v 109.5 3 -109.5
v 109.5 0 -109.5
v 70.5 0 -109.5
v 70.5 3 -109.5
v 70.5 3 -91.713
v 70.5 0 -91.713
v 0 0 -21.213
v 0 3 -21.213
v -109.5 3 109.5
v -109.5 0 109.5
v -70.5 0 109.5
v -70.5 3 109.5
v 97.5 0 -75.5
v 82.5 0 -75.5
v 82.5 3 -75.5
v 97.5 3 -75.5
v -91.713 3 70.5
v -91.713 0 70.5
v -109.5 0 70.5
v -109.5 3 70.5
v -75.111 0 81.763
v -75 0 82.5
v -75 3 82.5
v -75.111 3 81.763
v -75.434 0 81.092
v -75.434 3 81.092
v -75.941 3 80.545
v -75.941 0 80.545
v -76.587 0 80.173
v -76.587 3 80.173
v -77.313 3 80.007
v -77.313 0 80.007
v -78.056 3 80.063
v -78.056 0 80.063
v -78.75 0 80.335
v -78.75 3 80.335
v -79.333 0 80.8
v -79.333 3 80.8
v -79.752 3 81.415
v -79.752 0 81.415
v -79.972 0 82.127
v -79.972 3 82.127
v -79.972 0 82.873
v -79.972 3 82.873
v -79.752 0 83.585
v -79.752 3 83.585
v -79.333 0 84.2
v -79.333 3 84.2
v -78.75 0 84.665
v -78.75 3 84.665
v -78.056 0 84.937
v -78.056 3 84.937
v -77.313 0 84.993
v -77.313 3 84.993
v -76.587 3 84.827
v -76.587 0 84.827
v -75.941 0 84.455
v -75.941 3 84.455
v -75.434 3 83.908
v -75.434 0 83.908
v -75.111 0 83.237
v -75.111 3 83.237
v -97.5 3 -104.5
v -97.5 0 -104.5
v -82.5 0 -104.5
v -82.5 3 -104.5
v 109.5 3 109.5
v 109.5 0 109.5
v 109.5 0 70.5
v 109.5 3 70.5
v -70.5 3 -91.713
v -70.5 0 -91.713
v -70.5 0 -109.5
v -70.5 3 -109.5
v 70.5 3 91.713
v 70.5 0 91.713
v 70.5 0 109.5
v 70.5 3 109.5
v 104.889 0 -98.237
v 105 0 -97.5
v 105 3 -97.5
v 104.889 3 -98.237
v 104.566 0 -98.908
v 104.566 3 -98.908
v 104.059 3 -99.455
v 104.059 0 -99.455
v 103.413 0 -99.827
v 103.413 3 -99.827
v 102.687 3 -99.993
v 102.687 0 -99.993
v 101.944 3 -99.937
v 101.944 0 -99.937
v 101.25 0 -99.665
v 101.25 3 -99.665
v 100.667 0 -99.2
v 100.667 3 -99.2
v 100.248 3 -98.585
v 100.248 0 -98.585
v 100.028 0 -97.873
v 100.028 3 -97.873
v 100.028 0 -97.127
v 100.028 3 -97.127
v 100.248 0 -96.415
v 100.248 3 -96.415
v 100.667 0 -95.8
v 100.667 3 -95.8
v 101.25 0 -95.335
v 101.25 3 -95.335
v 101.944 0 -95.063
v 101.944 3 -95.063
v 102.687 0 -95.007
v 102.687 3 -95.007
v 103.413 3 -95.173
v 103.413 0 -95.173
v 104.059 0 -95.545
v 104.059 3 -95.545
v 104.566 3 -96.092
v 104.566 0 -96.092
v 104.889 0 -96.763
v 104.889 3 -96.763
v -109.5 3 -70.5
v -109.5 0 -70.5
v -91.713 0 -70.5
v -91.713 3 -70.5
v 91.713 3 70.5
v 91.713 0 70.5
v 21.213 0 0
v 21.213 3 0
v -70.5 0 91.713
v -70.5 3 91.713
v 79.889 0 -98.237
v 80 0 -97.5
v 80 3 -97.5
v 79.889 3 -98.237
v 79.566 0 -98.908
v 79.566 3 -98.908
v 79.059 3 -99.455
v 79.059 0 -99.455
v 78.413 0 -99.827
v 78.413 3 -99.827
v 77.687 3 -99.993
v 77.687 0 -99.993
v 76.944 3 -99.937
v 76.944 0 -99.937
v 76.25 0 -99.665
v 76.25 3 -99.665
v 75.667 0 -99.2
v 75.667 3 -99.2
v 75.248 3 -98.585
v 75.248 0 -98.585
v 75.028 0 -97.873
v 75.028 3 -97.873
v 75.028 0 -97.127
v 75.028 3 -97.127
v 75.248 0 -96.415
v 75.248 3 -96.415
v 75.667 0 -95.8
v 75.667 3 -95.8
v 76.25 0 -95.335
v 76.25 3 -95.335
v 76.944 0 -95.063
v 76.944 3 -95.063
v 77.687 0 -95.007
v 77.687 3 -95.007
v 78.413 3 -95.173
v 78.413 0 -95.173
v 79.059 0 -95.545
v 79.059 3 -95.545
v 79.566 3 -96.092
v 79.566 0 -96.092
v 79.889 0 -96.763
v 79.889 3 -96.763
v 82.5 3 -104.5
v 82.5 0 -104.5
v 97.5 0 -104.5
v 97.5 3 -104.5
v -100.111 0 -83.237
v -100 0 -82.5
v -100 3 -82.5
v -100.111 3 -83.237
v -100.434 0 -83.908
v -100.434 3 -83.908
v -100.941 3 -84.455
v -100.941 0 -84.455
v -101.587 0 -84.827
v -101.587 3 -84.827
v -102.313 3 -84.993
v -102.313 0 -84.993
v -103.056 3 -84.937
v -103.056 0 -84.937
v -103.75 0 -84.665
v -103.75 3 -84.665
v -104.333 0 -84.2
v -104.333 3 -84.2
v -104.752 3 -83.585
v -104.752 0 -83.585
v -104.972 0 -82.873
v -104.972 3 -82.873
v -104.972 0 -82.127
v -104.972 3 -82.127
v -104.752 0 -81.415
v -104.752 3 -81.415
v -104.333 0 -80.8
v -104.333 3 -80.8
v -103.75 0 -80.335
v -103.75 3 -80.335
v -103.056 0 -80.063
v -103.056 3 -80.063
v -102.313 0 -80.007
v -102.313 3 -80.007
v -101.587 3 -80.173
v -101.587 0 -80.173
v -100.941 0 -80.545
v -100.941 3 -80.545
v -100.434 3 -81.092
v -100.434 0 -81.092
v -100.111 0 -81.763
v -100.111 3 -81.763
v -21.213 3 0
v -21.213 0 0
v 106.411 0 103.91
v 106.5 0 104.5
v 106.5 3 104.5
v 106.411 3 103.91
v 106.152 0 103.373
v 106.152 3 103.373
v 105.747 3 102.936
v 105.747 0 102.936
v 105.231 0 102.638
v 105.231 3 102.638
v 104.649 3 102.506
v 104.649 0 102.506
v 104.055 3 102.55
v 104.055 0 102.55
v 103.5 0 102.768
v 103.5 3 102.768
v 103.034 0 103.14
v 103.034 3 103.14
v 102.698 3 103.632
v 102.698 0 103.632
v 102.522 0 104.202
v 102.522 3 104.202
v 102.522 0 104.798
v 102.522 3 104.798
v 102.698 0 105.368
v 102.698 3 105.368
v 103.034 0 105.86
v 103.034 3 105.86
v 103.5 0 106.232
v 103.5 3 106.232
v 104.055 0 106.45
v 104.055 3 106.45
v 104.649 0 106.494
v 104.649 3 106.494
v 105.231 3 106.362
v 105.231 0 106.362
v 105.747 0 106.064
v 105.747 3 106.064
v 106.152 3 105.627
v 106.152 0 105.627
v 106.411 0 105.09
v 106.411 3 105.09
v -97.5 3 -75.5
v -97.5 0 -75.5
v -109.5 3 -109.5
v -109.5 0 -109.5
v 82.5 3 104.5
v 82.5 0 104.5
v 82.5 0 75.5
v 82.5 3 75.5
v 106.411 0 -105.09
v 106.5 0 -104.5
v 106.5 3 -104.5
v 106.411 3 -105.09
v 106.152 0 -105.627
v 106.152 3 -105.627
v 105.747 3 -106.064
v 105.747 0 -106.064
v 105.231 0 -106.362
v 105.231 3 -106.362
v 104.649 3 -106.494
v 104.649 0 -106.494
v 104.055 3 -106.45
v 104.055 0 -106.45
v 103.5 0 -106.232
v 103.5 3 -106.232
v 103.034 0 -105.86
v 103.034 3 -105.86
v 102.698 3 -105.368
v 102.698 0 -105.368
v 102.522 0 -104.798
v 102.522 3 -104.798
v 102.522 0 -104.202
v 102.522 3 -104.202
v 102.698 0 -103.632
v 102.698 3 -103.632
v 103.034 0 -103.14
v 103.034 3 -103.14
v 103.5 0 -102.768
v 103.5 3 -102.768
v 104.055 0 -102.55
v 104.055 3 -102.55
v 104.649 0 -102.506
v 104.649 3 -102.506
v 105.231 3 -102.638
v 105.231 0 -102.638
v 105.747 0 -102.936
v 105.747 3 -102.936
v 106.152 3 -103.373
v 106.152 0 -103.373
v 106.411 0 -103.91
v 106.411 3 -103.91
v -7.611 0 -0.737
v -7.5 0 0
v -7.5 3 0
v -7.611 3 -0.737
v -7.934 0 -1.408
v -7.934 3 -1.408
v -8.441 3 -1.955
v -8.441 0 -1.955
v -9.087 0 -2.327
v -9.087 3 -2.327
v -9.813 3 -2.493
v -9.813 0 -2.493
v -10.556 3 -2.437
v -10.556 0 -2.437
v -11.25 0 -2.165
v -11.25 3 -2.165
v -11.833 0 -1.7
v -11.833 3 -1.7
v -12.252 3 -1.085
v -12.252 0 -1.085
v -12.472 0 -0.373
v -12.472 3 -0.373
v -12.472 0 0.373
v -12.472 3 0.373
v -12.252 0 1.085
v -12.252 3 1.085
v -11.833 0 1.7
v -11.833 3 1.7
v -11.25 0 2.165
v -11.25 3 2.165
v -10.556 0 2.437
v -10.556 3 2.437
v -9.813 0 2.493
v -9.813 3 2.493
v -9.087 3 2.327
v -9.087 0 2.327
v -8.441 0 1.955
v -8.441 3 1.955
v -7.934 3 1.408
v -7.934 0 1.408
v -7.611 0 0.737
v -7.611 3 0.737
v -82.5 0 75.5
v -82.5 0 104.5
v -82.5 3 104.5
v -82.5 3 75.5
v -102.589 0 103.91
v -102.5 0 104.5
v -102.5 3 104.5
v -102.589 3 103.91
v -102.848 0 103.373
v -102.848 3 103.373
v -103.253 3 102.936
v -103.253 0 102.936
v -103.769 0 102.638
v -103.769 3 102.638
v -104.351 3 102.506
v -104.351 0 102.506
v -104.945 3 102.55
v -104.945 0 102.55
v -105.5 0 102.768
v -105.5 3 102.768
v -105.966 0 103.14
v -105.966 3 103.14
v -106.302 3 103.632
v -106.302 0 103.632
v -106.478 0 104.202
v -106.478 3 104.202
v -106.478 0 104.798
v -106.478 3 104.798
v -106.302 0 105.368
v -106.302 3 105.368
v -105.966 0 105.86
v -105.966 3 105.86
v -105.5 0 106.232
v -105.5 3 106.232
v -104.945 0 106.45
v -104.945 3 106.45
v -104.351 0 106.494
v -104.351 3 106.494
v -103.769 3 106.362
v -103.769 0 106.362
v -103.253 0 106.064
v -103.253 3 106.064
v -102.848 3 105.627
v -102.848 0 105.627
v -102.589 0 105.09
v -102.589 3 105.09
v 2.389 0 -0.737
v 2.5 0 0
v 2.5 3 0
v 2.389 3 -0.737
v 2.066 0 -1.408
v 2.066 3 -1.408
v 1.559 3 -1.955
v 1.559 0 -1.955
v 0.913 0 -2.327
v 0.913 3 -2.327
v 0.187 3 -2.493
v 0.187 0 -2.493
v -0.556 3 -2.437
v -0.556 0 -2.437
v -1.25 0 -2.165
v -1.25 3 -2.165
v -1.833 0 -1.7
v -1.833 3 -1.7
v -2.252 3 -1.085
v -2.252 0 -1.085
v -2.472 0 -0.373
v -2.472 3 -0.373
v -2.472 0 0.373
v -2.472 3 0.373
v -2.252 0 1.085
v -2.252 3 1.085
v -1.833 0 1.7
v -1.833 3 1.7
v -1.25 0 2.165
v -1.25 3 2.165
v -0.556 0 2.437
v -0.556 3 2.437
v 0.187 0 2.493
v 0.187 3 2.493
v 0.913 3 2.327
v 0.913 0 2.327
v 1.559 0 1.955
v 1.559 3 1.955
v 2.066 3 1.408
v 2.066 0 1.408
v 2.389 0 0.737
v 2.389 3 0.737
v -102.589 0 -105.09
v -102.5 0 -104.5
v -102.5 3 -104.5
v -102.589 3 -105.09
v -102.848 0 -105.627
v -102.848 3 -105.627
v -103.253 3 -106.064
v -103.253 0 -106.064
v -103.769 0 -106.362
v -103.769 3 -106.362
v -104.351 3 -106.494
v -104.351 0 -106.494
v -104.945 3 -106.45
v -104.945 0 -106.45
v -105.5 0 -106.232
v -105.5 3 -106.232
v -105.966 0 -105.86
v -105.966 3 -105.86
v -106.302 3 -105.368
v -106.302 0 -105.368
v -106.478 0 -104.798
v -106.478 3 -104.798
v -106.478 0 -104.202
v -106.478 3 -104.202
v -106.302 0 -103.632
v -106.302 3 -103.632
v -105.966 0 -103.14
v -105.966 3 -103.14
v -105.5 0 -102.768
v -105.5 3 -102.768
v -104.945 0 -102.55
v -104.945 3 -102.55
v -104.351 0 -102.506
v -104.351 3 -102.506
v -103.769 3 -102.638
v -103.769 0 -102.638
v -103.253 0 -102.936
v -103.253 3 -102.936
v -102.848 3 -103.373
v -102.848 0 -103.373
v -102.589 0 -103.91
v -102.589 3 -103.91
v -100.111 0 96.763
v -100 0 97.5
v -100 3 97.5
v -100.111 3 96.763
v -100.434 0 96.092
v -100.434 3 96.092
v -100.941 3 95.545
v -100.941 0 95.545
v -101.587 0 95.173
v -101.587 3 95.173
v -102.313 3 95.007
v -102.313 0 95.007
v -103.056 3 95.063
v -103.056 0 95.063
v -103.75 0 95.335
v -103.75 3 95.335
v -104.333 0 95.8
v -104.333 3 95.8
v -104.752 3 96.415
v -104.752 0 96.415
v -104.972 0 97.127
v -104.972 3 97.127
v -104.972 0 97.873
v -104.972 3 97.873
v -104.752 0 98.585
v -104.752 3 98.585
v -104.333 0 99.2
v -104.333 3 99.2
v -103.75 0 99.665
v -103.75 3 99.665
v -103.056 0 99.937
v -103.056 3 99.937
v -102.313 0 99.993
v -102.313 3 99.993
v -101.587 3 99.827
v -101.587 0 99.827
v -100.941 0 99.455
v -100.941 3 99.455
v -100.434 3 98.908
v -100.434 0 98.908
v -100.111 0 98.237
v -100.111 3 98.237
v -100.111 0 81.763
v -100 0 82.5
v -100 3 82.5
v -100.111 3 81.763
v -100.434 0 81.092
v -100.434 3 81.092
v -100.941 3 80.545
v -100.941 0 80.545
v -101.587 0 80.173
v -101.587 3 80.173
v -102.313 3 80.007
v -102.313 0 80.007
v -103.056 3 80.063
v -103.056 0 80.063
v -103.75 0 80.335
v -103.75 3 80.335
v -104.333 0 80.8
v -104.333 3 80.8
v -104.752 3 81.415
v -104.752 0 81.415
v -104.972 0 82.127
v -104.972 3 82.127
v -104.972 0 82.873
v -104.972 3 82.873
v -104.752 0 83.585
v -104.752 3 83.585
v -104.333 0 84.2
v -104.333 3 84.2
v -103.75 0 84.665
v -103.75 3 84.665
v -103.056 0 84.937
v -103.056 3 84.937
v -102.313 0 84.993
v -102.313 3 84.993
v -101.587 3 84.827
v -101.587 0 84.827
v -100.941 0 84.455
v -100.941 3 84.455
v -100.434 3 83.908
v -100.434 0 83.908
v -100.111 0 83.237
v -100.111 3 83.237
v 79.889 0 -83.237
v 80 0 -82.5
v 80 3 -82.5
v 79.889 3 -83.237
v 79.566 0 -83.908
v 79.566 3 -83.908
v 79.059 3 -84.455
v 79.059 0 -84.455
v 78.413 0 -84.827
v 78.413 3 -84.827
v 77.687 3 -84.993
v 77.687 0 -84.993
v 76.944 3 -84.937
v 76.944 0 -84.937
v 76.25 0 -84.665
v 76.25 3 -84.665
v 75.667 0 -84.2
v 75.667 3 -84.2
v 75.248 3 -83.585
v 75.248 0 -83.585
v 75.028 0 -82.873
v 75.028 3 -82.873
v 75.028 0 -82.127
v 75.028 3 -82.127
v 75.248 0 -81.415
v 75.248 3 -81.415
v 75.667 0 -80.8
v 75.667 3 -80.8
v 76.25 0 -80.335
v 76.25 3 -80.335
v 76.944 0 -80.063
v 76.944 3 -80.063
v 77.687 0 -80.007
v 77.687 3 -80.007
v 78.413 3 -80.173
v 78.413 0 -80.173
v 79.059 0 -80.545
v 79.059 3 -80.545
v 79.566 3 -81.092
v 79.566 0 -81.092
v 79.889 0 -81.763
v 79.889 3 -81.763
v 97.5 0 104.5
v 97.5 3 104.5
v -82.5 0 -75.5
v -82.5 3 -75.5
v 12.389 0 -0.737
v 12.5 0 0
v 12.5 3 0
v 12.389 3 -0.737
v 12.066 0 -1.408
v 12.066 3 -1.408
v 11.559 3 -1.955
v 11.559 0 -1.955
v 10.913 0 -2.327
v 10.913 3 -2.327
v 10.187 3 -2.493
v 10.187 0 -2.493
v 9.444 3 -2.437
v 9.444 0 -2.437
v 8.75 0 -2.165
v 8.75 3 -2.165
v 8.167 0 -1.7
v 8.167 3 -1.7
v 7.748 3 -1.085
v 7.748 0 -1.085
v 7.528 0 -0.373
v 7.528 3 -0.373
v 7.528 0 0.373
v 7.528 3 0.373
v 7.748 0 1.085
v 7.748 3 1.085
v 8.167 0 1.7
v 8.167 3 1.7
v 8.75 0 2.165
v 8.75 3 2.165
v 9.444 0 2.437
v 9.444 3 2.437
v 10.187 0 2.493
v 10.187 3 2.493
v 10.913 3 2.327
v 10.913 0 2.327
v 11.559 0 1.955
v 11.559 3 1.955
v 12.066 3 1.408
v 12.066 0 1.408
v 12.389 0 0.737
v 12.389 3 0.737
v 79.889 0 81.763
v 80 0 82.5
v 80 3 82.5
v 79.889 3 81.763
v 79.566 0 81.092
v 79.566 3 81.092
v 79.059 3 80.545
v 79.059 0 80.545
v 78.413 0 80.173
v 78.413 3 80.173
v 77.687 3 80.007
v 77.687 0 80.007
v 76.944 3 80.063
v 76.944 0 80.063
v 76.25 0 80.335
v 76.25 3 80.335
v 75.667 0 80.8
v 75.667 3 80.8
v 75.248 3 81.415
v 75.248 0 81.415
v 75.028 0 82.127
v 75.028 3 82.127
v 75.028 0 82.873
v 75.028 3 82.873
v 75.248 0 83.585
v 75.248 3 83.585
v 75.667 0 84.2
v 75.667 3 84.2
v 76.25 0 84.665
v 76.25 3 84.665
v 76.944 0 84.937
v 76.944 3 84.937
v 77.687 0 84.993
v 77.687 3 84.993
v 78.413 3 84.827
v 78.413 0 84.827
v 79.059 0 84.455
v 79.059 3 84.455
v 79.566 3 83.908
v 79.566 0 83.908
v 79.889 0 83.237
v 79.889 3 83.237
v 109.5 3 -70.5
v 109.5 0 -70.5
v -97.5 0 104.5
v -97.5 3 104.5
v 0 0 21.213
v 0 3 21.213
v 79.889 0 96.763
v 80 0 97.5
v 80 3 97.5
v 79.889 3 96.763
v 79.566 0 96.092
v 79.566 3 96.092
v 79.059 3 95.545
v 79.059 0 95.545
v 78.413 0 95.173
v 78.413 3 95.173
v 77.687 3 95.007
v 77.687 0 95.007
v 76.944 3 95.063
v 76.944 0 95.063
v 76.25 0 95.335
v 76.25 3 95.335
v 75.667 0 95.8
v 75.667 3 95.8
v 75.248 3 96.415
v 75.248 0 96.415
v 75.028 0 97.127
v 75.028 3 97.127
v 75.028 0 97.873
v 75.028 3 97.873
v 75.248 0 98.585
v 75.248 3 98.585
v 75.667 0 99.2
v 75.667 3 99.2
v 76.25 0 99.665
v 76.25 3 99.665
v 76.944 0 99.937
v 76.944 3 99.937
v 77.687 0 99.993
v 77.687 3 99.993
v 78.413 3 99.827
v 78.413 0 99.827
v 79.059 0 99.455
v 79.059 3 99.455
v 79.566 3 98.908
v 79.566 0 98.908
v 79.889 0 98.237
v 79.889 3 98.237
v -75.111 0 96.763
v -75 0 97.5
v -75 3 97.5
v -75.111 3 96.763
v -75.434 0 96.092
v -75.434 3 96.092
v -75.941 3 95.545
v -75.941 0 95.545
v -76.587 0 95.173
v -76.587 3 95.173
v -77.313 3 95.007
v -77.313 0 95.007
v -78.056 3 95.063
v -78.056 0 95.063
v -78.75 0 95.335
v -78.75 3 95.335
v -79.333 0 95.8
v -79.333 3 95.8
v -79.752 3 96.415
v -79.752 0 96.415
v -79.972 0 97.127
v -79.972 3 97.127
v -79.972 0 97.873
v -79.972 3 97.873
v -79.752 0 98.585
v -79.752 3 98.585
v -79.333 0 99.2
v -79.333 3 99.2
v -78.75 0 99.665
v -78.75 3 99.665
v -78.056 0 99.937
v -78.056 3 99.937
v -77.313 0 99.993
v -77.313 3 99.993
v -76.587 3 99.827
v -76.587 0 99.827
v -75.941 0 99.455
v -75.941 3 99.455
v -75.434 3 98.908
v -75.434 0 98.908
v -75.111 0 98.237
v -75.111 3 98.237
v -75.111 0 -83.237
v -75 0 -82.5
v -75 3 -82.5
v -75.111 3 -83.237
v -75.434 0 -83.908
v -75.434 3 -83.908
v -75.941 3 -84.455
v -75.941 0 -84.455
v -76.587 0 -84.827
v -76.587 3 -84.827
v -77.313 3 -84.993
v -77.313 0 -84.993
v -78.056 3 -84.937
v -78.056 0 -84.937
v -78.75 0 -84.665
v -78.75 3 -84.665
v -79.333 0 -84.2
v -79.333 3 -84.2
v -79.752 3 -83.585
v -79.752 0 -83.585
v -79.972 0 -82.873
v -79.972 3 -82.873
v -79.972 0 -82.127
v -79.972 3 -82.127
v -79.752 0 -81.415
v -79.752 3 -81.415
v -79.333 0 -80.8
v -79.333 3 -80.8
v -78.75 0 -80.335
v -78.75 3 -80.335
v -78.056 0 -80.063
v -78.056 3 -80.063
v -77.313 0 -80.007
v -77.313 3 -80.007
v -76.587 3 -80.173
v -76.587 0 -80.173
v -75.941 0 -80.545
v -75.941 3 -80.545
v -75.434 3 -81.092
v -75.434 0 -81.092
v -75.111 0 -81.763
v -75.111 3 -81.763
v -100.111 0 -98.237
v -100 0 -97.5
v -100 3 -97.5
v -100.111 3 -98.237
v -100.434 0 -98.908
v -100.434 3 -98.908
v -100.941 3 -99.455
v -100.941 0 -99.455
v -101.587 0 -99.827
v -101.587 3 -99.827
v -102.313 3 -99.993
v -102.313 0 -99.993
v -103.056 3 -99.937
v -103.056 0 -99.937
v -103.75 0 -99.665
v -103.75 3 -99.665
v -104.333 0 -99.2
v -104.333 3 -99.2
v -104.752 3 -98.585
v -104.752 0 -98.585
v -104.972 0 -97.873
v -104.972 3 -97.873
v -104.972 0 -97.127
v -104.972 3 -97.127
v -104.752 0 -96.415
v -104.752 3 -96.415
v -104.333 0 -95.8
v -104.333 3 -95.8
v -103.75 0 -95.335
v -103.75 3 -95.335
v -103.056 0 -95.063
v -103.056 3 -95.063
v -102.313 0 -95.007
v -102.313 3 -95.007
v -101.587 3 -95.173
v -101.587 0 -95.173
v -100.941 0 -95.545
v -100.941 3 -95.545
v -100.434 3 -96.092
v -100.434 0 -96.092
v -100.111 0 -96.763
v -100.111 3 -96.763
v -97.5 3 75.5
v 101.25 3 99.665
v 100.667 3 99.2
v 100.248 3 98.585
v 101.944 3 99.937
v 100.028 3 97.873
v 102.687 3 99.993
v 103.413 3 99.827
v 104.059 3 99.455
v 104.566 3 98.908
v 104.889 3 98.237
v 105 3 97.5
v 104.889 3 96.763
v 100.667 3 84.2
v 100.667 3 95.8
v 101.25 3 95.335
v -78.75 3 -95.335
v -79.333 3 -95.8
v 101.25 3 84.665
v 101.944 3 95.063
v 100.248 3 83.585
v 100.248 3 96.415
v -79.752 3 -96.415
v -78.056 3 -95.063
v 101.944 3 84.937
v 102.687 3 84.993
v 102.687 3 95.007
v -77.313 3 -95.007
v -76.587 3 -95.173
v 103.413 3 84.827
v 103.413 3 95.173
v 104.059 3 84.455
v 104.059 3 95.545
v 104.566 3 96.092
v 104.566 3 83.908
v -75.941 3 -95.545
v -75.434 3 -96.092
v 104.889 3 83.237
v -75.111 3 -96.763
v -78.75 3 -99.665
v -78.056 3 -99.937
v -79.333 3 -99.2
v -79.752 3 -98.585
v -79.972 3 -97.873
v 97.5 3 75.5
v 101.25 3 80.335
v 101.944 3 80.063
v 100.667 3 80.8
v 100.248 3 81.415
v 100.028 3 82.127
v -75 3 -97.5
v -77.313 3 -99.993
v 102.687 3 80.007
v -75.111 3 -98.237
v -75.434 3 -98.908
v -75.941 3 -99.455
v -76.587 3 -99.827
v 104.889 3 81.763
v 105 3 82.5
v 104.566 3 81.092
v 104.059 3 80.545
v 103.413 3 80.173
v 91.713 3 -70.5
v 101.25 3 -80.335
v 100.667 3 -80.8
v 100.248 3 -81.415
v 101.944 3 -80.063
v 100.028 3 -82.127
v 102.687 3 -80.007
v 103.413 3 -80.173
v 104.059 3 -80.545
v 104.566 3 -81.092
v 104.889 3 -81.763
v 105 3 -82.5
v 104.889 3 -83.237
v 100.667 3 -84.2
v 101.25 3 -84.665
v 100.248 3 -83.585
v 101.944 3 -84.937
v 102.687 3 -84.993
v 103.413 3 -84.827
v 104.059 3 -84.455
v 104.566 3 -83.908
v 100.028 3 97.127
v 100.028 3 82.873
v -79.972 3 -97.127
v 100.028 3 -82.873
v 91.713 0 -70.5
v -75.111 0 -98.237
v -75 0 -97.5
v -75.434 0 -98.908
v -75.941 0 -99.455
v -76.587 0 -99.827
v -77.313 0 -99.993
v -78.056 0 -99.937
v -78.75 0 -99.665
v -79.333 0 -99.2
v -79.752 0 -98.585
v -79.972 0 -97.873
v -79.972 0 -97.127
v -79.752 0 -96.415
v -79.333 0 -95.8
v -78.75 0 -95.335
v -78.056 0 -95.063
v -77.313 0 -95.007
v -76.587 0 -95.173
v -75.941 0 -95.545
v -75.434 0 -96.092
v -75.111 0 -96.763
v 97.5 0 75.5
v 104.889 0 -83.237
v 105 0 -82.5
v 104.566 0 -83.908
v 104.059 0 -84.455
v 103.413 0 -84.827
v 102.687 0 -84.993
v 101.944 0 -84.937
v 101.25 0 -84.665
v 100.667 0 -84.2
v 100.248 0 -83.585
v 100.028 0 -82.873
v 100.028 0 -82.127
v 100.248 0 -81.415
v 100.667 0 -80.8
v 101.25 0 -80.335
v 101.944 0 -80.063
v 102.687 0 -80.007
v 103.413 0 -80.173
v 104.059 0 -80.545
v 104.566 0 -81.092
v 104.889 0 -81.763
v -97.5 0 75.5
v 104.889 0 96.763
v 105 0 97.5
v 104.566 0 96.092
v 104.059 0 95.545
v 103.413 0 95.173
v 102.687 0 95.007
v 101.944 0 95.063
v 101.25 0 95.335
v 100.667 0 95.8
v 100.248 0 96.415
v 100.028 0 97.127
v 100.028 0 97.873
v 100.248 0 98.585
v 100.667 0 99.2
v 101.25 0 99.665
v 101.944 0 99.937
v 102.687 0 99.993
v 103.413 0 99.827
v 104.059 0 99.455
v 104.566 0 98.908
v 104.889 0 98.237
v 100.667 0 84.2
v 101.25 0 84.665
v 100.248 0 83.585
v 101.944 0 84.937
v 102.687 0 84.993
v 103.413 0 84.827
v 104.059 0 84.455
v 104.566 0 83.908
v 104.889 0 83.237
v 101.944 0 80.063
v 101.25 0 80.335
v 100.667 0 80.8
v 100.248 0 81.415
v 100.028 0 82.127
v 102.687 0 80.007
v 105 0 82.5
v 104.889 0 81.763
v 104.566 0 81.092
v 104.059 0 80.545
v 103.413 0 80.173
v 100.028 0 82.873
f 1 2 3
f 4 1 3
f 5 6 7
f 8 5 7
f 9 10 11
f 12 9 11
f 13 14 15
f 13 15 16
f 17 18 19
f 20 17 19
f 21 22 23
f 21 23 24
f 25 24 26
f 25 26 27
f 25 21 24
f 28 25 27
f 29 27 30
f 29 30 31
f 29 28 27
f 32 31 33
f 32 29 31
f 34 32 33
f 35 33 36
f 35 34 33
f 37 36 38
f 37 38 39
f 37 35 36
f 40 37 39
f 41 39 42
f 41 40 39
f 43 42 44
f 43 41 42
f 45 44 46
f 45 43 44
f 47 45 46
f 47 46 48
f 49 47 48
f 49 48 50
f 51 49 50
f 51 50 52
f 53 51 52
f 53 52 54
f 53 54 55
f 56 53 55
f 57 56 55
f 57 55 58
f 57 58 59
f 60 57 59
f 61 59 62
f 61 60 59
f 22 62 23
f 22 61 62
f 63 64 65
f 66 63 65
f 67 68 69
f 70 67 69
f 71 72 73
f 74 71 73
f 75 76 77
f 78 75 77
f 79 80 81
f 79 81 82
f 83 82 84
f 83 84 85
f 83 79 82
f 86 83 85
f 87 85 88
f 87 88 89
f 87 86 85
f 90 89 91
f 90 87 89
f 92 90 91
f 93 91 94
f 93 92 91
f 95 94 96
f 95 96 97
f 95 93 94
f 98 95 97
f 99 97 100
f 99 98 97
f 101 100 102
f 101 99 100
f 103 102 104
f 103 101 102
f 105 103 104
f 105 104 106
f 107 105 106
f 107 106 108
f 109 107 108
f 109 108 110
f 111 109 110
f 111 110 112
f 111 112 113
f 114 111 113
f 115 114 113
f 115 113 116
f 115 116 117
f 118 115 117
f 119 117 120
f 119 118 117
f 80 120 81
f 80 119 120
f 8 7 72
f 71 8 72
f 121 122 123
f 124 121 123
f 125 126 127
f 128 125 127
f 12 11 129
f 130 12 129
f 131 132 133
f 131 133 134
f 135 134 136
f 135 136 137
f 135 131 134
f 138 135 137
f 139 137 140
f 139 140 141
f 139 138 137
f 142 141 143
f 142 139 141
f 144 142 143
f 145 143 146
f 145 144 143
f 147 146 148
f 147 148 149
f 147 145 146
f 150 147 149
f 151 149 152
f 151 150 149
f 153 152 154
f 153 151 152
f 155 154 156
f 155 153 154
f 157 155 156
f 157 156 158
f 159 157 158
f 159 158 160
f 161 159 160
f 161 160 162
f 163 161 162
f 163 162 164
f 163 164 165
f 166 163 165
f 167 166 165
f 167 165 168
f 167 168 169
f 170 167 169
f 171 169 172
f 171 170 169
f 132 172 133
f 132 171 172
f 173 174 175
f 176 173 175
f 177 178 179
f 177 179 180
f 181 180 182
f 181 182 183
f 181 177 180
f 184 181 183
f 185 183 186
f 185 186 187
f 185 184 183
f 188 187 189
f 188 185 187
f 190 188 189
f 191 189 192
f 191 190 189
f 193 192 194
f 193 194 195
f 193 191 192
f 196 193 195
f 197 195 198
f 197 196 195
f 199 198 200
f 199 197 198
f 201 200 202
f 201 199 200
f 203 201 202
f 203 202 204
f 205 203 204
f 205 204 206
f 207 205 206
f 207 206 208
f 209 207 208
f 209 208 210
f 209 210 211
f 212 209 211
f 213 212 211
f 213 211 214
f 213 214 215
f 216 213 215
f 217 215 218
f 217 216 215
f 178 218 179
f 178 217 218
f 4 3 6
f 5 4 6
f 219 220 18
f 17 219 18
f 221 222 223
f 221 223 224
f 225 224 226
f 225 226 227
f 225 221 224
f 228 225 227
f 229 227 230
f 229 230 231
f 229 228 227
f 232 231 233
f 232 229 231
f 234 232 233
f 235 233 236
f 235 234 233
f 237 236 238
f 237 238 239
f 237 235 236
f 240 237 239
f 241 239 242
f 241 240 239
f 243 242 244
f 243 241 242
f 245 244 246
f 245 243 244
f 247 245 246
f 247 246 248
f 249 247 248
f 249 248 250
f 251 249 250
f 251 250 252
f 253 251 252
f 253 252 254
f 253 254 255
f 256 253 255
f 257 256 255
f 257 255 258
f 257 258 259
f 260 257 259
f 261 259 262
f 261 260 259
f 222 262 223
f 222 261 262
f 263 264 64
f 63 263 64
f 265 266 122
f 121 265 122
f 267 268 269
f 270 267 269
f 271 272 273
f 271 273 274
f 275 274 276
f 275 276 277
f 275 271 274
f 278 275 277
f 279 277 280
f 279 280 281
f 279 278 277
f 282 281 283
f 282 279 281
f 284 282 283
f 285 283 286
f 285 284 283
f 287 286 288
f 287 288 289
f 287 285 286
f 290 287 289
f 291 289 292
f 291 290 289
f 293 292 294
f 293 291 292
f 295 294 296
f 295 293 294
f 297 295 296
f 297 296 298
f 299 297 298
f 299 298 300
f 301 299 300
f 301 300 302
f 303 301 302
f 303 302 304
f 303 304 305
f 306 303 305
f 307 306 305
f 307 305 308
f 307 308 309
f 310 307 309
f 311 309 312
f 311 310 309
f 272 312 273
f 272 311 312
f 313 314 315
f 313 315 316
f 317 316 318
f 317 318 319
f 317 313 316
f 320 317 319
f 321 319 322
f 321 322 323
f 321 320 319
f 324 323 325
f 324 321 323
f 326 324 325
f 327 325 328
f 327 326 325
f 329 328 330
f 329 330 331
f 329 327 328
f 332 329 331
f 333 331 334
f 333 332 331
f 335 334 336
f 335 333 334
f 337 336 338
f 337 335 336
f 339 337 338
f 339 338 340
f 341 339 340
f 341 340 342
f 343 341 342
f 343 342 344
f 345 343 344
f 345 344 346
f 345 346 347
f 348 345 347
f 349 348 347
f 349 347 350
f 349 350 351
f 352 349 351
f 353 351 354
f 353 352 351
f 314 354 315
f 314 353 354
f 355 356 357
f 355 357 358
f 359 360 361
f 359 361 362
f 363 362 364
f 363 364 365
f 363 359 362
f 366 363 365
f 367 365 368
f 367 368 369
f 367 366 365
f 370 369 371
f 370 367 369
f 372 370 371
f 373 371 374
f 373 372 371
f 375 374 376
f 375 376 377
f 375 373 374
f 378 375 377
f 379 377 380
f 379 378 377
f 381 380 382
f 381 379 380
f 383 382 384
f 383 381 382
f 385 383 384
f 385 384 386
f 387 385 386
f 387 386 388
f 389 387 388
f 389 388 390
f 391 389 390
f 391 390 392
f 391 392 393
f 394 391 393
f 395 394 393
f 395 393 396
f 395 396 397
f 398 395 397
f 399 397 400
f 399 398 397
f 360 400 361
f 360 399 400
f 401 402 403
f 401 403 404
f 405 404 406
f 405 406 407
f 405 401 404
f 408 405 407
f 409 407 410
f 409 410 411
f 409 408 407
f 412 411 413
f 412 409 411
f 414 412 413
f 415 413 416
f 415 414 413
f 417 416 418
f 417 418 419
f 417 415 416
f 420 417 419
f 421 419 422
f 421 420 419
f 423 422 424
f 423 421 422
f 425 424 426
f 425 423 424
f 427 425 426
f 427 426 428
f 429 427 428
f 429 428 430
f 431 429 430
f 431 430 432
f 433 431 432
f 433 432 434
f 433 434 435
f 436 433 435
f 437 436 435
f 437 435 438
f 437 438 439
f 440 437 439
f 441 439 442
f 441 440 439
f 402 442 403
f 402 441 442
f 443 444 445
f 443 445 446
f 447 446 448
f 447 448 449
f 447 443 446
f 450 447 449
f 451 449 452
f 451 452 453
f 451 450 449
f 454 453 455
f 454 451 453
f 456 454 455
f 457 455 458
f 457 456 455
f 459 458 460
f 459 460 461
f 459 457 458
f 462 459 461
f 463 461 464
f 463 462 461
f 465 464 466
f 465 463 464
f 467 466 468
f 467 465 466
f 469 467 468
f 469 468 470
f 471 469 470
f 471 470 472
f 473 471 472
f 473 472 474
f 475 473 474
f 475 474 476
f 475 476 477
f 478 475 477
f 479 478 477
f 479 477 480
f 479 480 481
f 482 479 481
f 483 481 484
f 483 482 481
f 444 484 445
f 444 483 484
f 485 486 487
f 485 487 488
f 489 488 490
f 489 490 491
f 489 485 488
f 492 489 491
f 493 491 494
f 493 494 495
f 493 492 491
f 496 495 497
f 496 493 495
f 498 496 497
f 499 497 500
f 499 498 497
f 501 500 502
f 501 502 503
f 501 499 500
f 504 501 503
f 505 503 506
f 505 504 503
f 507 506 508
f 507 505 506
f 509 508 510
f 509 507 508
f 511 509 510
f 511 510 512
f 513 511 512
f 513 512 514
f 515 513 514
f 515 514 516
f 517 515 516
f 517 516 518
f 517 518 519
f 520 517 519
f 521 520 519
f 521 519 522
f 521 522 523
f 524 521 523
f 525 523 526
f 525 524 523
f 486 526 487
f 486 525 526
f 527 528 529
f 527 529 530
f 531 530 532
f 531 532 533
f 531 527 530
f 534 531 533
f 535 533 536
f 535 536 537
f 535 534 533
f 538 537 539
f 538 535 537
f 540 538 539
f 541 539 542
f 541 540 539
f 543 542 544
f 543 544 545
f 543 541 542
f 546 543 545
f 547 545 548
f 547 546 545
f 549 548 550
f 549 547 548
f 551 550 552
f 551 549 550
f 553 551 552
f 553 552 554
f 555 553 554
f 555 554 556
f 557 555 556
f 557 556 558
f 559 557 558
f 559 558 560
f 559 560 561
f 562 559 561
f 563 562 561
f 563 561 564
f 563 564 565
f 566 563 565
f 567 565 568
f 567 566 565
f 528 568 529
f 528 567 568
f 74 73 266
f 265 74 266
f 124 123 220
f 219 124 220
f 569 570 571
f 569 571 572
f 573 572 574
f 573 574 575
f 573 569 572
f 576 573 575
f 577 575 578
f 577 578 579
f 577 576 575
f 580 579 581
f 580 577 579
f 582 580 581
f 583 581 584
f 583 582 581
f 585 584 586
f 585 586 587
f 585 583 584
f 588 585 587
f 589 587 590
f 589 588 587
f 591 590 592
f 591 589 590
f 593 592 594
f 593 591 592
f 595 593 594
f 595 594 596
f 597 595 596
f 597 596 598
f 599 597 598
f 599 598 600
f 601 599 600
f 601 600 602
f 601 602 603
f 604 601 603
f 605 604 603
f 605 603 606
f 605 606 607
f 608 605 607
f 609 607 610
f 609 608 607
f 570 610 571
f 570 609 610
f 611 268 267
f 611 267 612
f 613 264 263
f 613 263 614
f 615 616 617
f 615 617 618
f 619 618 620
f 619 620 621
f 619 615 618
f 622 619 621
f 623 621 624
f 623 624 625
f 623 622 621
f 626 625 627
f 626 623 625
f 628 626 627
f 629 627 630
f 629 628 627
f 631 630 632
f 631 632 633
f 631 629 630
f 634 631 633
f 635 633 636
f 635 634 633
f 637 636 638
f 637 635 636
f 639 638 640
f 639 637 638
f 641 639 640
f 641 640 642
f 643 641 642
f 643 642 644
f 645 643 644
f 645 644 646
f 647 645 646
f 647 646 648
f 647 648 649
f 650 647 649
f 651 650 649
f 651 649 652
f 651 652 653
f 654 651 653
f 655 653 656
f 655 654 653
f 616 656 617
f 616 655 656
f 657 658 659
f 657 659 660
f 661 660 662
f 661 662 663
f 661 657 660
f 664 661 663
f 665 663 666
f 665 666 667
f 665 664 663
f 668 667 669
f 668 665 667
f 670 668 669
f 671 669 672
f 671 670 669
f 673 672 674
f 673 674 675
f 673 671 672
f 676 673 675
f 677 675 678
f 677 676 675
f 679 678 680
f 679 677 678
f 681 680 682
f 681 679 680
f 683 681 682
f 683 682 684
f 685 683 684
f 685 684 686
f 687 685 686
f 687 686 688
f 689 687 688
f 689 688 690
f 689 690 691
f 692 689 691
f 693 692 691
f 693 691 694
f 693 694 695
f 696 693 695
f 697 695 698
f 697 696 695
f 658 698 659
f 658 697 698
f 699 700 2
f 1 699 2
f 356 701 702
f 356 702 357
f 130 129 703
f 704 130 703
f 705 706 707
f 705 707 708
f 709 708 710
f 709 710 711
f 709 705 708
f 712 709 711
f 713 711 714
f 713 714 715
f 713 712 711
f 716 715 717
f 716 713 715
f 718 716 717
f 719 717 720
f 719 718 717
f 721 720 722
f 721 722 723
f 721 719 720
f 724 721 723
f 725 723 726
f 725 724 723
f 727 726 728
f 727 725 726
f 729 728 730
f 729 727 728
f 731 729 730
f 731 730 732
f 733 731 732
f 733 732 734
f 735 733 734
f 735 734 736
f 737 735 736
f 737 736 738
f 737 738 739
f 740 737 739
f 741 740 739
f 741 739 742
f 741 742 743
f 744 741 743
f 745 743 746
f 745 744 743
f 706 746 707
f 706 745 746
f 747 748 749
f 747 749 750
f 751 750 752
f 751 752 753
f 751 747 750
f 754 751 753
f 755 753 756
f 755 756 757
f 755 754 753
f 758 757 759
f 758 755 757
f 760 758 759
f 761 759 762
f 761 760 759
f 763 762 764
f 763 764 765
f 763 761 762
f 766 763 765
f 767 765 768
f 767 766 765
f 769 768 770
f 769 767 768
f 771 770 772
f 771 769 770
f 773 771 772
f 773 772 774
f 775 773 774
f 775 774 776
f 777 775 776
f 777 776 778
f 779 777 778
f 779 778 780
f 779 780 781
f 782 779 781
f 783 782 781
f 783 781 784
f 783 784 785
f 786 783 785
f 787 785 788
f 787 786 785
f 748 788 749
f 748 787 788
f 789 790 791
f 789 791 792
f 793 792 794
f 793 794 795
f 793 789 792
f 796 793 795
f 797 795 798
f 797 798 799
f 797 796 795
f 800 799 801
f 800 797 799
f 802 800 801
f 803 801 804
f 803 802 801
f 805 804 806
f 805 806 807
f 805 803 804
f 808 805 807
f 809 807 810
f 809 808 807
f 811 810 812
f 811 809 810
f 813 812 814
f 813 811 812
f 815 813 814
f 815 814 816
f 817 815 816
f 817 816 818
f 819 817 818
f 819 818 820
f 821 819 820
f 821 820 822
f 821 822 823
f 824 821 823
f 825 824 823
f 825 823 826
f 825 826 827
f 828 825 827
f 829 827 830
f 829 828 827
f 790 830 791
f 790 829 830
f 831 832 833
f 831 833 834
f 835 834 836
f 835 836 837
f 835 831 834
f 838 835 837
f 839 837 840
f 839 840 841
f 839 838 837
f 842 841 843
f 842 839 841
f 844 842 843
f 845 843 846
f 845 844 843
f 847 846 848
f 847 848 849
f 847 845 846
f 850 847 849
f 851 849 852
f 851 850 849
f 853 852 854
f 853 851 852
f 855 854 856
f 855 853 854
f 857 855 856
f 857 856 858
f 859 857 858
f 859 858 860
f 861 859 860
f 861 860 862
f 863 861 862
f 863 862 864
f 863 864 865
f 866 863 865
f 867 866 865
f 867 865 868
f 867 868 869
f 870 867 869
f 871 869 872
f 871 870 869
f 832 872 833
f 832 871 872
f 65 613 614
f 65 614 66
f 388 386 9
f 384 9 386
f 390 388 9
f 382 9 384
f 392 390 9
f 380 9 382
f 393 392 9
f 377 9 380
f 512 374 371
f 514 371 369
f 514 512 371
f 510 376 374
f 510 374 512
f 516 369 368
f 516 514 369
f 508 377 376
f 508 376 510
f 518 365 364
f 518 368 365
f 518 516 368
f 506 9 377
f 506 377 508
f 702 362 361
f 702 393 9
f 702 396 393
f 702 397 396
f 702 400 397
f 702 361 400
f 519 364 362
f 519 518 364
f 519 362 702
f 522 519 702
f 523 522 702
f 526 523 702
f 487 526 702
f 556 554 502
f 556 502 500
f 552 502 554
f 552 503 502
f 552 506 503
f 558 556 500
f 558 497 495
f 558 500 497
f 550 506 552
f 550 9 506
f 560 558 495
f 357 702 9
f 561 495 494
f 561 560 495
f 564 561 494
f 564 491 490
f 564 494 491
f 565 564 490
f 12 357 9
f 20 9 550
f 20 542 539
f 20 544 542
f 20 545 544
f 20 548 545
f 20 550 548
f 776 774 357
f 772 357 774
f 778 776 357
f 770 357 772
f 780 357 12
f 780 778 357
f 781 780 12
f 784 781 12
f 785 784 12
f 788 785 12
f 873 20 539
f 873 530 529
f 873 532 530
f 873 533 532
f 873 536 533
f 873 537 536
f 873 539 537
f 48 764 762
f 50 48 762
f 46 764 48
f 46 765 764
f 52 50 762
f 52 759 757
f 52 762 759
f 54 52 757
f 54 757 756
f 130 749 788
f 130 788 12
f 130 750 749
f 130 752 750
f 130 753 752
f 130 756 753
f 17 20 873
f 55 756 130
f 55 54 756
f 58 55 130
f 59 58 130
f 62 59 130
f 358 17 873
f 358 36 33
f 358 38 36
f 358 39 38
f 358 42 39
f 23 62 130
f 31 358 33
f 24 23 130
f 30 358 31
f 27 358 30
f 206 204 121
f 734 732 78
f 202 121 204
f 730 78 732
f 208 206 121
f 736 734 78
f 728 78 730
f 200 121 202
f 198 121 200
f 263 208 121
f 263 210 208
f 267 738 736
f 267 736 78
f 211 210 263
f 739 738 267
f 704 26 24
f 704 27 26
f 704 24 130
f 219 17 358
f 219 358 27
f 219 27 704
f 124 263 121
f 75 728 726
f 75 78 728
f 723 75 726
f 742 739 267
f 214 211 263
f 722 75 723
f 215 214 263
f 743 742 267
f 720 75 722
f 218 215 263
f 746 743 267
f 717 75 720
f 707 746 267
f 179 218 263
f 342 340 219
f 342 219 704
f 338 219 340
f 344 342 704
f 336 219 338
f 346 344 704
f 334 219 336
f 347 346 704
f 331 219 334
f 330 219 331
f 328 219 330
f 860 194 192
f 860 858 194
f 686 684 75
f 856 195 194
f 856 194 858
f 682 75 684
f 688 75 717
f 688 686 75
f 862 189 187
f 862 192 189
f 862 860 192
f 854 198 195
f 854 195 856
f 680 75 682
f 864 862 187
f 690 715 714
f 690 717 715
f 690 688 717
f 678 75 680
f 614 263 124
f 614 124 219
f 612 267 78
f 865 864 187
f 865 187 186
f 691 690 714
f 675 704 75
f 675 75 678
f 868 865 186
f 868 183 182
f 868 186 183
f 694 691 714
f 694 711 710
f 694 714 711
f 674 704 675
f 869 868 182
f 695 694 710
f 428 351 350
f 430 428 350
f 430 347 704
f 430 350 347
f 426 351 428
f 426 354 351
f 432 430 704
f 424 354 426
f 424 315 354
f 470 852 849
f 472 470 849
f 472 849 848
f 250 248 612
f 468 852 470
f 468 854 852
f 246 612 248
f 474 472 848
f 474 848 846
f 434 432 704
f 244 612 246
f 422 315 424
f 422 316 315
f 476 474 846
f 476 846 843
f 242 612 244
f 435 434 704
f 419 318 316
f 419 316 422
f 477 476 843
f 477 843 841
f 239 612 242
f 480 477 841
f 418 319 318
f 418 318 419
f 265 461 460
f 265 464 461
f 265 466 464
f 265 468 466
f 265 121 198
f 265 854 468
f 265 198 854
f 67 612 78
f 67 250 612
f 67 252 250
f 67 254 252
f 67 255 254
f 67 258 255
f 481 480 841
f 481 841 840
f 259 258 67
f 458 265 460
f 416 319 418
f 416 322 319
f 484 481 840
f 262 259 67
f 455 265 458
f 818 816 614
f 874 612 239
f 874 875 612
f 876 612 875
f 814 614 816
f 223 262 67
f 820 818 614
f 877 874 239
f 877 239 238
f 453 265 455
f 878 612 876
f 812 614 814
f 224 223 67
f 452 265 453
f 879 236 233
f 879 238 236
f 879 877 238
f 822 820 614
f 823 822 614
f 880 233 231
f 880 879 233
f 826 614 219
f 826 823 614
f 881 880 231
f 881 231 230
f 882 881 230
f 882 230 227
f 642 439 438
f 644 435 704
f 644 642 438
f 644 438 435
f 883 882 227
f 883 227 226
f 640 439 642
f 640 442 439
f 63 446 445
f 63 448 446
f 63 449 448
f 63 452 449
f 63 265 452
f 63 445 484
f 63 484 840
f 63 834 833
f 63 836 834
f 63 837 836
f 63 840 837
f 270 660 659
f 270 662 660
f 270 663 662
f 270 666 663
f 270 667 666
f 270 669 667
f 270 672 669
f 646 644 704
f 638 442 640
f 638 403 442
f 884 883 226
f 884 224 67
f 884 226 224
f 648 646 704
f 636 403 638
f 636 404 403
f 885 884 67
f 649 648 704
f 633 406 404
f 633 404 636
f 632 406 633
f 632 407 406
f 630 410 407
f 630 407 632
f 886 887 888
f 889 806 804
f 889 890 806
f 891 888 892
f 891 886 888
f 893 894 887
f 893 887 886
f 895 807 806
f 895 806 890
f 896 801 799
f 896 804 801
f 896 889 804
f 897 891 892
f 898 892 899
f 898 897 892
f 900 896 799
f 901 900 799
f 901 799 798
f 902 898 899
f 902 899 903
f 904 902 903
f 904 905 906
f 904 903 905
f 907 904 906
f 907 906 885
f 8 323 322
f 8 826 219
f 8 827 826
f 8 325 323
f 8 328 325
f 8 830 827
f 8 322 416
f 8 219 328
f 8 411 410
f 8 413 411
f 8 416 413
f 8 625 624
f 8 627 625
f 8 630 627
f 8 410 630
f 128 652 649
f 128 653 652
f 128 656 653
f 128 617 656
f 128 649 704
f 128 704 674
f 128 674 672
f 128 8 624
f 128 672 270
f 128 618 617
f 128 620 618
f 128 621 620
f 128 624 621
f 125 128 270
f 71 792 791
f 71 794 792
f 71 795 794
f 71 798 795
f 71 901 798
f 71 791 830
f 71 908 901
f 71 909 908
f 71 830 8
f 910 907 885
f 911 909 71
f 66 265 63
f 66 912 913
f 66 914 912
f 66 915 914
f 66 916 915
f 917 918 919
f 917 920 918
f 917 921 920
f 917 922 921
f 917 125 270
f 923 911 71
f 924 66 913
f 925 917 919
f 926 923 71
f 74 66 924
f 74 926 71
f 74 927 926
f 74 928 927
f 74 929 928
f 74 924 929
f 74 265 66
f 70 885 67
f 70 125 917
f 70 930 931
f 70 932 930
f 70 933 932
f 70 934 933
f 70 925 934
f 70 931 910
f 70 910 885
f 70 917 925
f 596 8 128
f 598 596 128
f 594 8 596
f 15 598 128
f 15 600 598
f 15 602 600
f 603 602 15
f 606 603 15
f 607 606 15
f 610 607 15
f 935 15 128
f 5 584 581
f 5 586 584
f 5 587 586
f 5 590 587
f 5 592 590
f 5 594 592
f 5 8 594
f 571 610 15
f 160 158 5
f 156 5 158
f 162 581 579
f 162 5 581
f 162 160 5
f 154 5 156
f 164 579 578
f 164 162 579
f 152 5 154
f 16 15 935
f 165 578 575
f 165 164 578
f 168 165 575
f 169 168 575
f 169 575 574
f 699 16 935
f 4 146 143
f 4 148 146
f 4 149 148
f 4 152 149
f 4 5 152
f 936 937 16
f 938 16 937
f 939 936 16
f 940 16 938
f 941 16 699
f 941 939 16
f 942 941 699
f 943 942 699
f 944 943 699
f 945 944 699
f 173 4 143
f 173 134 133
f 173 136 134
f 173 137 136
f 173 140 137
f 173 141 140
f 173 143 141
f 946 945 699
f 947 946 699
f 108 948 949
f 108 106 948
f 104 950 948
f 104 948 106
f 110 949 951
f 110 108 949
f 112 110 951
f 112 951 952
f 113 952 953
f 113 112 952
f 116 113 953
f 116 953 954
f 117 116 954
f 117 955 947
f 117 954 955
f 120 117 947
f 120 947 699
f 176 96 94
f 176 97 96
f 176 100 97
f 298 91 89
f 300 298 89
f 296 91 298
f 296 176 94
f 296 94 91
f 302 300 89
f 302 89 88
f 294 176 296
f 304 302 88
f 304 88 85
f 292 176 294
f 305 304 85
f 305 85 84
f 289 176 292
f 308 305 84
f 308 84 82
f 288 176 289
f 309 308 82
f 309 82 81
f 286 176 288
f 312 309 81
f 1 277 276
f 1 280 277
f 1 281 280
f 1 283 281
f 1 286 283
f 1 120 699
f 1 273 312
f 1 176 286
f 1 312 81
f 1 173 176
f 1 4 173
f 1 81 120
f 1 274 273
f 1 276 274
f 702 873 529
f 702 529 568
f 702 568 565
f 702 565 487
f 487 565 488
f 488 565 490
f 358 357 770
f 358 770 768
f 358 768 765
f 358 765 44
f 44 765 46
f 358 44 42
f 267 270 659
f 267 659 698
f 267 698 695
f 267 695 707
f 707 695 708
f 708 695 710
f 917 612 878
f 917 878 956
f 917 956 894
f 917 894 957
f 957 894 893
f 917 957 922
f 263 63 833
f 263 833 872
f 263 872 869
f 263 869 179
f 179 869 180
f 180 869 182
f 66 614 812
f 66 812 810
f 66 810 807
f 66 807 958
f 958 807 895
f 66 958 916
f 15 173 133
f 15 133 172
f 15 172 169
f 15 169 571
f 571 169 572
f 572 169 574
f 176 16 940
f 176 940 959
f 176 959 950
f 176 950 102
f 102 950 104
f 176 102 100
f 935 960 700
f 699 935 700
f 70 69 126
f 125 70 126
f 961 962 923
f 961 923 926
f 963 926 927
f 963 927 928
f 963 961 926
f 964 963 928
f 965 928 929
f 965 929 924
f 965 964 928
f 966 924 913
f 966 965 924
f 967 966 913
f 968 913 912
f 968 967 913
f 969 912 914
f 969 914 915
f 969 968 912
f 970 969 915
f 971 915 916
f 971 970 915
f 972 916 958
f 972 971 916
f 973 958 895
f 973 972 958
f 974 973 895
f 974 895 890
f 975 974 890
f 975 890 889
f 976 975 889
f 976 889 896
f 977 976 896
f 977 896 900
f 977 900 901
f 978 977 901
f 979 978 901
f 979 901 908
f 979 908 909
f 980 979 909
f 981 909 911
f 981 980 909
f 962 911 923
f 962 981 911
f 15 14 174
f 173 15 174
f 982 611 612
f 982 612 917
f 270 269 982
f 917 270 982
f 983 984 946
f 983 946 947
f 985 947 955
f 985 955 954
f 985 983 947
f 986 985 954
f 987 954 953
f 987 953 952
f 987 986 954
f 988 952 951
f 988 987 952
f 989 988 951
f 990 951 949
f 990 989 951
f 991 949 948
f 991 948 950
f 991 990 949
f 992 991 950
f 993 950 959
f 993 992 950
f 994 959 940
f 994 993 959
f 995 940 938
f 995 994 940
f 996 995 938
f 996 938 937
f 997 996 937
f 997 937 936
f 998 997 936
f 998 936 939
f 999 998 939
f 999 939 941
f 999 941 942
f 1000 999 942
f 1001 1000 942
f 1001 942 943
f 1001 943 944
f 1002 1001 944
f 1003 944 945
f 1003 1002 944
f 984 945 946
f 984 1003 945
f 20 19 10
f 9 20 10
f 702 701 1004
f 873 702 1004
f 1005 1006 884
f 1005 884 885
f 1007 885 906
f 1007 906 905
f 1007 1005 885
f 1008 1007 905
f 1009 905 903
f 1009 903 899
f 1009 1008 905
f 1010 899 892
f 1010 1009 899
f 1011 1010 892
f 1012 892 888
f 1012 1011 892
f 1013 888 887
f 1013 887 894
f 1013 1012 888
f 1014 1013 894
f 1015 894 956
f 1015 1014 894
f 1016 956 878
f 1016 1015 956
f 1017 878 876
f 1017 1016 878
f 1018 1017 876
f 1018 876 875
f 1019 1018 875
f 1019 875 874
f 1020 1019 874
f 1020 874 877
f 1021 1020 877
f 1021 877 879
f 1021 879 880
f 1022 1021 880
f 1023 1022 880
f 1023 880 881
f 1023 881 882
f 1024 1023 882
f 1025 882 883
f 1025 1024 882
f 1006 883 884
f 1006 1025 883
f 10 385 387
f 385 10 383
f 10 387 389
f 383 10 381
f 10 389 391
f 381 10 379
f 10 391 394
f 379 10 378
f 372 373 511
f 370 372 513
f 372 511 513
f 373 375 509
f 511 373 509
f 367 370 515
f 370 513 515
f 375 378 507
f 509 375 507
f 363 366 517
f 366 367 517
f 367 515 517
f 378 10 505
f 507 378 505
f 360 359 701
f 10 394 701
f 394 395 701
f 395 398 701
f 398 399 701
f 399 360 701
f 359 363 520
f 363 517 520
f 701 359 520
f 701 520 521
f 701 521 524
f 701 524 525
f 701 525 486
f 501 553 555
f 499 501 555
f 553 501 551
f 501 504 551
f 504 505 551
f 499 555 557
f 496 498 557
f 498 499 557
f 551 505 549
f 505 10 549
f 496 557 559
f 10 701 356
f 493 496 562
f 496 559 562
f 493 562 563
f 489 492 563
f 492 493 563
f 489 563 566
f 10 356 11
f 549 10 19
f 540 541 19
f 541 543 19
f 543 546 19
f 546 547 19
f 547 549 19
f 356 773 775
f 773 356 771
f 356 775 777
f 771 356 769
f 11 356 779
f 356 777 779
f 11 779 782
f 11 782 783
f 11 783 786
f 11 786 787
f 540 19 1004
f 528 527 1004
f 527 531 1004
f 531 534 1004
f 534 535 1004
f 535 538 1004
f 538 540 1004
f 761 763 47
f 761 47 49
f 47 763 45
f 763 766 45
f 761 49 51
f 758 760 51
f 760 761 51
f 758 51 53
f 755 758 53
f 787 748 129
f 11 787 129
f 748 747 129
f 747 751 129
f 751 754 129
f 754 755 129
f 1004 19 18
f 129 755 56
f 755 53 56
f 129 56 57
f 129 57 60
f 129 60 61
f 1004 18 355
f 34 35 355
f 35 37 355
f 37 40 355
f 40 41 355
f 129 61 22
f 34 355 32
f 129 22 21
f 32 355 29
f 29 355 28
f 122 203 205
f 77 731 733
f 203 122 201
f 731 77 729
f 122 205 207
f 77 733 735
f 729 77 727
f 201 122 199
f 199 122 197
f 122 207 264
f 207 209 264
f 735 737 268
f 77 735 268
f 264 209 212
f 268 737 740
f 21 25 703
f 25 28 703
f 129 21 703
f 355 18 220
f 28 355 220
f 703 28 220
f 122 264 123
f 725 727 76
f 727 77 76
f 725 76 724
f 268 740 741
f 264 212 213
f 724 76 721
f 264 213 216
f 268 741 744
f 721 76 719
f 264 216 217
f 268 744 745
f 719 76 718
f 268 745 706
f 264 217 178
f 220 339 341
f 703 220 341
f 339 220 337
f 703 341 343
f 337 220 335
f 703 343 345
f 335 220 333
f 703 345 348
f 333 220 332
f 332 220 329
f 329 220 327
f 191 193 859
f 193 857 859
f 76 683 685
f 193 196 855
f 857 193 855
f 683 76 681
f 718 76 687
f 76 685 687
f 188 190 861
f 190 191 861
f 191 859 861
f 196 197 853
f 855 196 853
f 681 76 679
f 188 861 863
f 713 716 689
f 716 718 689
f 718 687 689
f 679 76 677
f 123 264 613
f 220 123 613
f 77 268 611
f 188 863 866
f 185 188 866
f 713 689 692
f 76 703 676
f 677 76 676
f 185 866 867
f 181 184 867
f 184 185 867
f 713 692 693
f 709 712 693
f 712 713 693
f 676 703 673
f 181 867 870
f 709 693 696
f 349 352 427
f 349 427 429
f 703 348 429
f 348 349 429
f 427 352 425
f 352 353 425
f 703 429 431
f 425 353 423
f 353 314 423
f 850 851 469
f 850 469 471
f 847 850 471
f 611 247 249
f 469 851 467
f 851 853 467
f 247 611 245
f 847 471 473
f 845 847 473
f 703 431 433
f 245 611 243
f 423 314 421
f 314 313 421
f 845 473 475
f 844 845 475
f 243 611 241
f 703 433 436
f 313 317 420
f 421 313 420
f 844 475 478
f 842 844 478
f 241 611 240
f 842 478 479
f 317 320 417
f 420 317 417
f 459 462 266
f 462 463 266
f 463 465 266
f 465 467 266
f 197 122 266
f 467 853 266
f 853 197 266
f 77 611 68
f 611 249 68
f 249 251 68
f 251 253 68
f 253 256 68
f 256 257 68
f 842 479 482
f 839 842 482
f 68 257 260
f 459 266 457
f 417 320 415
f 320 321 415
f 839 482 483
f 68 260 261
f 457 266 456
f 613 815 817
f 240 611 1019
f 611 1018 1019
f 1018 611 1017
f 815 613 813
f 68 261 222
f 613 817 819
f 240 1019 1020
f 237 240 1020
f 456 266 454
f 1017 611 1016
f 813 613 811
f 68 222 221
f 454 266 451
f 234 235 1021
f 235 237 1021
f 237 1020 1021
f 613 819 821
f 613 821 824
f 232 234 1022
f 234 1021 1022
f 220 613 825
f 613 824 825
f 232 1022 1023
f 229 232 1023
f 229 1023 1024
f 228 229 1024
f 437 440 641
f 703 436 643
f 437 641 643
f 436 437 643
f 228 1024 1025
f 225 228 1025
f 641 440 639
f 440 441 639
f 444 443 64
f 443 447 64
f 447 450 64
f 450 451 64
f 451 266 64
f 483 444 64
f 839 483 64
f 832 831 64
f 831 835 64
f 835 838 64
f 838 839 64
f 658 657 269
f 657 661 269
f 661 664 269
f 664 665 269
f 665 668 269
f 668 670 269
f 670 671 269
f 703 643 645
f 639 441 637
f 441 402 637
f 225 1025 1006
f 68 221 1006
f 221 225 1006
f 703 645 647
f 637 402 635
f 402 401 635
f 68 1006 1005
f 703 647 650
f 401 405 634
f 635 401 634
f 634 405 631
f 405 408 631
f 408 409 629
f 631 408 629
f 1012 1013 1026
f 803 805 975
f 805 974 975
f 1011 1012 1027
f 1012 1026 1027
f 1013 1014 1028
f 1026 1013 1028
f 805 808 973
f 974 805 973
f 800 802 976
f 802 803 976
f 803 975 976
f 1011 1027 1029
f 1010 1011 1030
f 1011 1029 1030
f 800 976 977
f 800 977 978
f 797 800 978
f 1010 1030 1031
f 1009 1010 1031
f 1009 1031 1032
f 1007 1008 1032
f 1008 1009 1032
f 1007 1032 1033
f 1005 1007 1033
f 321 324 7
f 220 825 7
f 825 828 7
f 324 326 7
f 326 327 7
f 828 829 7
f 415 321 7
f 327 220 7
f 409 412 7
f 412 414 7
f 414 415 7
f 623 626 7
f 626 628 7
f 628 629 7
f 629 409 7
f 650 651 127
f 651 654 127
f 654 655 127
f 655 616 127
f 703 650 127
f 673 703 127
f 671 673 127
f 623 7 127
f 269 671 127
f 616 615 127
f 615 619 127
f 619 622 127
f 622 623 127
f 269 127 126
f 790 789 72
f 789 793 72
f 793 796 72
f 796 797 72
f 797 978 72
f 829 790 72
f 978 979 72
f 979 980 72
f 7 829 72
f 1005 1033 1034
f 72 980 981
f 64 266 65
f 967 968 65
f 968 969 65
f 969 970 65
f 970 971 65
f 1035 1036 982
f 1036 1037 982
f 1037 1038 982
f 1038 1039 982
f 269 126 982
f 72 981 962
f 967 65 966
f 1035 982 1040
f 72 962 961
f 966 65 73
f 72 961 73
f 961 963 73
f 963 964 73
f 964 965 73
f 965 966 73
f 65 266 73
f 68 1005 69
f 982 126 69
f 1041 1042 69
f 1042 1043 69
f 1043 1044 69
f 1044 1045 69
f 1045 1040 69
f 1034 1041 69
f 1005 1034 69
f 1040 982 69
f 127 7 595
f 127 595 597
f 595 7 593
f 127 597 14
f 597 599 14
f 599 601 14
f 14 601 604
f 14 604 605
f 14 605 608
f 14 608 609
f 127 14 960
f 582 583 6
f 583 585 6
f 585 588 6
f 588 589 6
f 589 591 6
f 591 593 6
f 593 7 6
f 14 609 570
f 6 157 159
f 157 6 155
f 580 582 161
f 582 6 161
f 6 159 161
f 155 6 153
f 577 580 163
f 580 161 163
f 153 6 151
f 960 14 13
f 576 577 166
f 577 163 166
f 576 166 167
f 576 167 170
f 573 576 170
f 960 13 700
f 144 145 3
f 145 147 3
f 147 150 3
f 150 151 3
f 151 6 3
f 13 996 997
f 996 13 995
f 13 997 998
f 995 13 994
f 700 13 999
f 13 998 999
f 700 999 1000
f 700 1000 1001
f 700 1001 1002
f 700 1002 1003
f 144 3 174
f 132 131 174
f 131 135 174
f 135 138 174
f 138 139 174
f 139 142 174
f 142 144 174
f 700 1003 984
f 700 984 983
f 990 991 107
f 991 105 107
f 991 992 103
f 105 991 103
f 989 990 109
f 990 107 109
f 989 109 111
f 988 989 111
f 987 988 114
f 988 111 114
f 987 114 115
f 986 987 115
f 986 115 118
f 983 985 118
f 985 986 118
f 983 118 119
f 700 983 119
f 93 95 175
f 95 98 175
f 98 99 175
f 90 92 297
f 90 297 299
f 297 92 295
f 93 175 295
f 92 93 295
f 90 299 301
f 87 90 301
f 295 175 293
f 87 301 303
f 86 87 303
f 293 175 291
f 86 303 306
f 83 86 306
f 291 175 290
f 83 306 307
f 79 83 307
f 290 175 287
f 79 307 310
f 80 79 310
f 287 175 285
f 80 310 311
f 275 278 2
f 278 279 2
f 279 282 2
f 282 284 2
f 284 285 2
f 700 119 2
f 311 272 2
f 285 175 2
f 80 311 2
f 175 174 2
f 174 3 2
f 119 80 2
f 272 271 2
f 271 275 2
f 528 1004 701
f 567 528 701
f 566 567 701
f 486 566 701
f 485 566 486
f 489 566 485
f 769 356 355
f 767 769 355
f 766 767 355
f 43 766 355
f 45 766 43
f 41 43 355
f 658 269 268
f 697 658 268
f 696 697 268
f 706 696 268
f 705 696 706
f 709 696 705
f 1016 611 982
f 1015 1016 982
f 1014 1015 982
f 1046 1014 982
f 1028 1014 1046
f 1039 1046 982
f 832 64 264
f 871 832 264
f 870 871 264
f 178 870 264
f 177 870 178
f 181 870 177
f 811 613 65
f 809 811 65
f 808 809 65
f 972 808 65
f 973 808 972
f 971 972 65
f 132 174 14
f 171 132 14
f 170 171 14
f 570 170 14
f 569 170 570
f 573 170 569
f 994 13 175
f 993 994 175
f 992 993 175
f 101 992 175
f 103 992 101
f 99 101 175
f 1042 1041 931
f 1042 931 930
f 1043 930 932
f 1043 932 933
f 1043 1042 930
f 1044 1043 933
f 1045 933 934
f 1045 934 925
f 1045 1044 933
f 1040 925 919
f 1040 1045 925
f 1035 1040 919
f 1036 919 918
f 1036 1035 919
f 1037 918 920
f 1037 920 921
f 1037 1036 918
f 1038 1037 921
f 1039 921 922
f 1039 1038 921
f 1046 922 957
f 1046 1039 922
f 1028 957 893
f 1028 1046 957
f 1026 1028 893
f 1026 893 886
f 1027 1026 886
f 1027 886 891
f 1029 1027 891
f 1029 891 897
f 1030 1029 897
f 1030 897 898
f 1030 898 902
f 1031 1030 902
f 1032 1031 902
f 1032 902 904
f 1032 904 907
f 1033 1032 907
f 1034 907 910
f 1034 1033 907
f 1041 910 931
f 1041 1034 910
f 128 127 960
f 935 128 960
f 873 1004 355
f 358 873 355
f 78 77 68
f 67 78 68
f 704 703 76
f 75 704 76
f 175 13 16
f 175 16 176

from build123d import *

# Parameters (mm, degrees)
SKETCH1_R           = 2
SKETCH1_R_2         = 2.5
SKETCH1_W           = 15
SKETCH1_H           = 29
BOSS_EXTRUDE1_DEPTH = 3


with BuildPart() as part:
    # Sketch1 → Boss-Extrude1 (new body)
    with BuildSketch(Plane(origin=(0, 0, 0), x_dir=(1, 0, 0), z_dir=(0, 1, 0))):
        Polygon((-70.5, -91.713203436), (0, -21.213203436), (70.5, -91.713203436), (70.5, -109.5), (109.5, -109.5), (109.5, -70.5), (91.713203436, -70.5), (21.213203436, 0), (91.713203436, 70.5), (109.5, 70.5), (109.5, 109.5), (70.5, 109.5), (70.5, 91.713203436), (0, 21.213203436), (-70.5, 91.713203436), (-70.5, 109.5), (-109.5, 109.5), (-109.5, 70.5), (-91.713203436, 70.5), (-21.213203436, 0), (-91.713203436, -70.5), (-109.5, -70.5), (-109.5, -109.5), (-70.5, -109.5), align=None)
        with Locations((-104.5, -104.5)):
            Circle(SKETCH1_R, mode=Mode.SUBTRACT)
        with Locations((-102.5, -82.5)):
            Circle(SKETCH1_R_2, mode=Mode.SUBTRACT)
        with Locations((-77.5, -82.5)):
            Circle(SKETCH1_R_2, mode=Mode.SUBTRACT)
        with Locations((-77.5, -97.5)):
            Circle(SKETCH1_R_2, mode=Mode.SUBTRACT)
        with Locations((-102.5, -97.5)):
            Circle(SKETCH1_R_2, mode=Mode.SUBTRACT)
        with Locations((102.5, -97.5)):
            Circle(SKETCH1_R_2, mode=Mode.SUBTRACT)
        with Locations((77.5, -97.5)):
            Circle(SKETCH1_R_2, mode=Mode.SUBTRACT)
        with Locations((77.5, -82.5)):
            Circle(SKETCH1_R_2, mode=Mode.SUBTRACT)
        with Locations((102.5, -82.5)):
            Circle(SKETCH1_R_2, mode=Mode.SUBTRACT)
        with Locations((104.5, -104.5)):
            Circle(SKETCH1_R, mode=Mode.SUBTRACT)
        with Locations((104.5, 104.5)):
            Circle(SKETCH1_R, mode=Mode.SUBTRACT)
        with Locations((102.5, 82.5)):
            Circle(SKETCH1_R_2, mode=Mode.SUBTRACT)
        with Locations((77.5, 82.5)):
            Circle(SKETCH1_R_2, mode=Mode.SUBTRACT)
        with Locations((77.5, 97.5)):
            Circle(SKETCH1_R_2, mode=Mode.SUBTRACT)
        with Locations((102.5, 97.5)):
            Circle(SKETCH1_R_2, mode=Mode.SUBTRACT)
        with Locations((-102.5, 97.5)):
            Circle(SKETCH1_R_2, mode=Mode.SUBTRACT)
        with Locations((-77.5, 97.5)):
            Circle(SKETCH1_R_2, mode=Mode.SUBTRACT)
        with Locations((-77.5, 82.5)):
            Circle(SKETCH1_R_2, mode=Mode.SUBTRACT)
        with Locations((-102.5, 82.5)):
            Circle(SKETCH1_R_2, mode=Mode.SUBTRACT)
        with Locations((-104.5, 104.5)):
            Circle(SKETCH1_R, mode=Mode.SUBTRACT)
        Circle(SKETCH1_R_2, mode=Mode.SUBTRACT)
        with Locations((-10, 0)):
            Circle(SKETCH1_R_2, mode=Mode.SUBTRACT)
        with Locations((10, 0)):
            Circle(SKETCH1_R_2, mode=Mode.SUBTRACT)
        with Locations((-90, -90)):
            Rectangle(SKETCH1_W, SKETCH1_H, mode=Mode.SUBTRACT)
        with Locations((90, -90)):
            Rectangle(SKETCH1_W, SKETCH1_H, mode=Mode.SUBTRACT)
        with Locations((90, 90)):
            Rectangle(SKETCH1_W, SKETCH1_H, mode=Mode.SUBTRACT)
        with Locations((-90, 90)):
            Rectangle(SKETCH1_W, SKETCH1_H, mode=Mode.SUBTRACT)
    extrude(amount=BOSS_EXTRUDE1_DEPTH)


solid = part.part
